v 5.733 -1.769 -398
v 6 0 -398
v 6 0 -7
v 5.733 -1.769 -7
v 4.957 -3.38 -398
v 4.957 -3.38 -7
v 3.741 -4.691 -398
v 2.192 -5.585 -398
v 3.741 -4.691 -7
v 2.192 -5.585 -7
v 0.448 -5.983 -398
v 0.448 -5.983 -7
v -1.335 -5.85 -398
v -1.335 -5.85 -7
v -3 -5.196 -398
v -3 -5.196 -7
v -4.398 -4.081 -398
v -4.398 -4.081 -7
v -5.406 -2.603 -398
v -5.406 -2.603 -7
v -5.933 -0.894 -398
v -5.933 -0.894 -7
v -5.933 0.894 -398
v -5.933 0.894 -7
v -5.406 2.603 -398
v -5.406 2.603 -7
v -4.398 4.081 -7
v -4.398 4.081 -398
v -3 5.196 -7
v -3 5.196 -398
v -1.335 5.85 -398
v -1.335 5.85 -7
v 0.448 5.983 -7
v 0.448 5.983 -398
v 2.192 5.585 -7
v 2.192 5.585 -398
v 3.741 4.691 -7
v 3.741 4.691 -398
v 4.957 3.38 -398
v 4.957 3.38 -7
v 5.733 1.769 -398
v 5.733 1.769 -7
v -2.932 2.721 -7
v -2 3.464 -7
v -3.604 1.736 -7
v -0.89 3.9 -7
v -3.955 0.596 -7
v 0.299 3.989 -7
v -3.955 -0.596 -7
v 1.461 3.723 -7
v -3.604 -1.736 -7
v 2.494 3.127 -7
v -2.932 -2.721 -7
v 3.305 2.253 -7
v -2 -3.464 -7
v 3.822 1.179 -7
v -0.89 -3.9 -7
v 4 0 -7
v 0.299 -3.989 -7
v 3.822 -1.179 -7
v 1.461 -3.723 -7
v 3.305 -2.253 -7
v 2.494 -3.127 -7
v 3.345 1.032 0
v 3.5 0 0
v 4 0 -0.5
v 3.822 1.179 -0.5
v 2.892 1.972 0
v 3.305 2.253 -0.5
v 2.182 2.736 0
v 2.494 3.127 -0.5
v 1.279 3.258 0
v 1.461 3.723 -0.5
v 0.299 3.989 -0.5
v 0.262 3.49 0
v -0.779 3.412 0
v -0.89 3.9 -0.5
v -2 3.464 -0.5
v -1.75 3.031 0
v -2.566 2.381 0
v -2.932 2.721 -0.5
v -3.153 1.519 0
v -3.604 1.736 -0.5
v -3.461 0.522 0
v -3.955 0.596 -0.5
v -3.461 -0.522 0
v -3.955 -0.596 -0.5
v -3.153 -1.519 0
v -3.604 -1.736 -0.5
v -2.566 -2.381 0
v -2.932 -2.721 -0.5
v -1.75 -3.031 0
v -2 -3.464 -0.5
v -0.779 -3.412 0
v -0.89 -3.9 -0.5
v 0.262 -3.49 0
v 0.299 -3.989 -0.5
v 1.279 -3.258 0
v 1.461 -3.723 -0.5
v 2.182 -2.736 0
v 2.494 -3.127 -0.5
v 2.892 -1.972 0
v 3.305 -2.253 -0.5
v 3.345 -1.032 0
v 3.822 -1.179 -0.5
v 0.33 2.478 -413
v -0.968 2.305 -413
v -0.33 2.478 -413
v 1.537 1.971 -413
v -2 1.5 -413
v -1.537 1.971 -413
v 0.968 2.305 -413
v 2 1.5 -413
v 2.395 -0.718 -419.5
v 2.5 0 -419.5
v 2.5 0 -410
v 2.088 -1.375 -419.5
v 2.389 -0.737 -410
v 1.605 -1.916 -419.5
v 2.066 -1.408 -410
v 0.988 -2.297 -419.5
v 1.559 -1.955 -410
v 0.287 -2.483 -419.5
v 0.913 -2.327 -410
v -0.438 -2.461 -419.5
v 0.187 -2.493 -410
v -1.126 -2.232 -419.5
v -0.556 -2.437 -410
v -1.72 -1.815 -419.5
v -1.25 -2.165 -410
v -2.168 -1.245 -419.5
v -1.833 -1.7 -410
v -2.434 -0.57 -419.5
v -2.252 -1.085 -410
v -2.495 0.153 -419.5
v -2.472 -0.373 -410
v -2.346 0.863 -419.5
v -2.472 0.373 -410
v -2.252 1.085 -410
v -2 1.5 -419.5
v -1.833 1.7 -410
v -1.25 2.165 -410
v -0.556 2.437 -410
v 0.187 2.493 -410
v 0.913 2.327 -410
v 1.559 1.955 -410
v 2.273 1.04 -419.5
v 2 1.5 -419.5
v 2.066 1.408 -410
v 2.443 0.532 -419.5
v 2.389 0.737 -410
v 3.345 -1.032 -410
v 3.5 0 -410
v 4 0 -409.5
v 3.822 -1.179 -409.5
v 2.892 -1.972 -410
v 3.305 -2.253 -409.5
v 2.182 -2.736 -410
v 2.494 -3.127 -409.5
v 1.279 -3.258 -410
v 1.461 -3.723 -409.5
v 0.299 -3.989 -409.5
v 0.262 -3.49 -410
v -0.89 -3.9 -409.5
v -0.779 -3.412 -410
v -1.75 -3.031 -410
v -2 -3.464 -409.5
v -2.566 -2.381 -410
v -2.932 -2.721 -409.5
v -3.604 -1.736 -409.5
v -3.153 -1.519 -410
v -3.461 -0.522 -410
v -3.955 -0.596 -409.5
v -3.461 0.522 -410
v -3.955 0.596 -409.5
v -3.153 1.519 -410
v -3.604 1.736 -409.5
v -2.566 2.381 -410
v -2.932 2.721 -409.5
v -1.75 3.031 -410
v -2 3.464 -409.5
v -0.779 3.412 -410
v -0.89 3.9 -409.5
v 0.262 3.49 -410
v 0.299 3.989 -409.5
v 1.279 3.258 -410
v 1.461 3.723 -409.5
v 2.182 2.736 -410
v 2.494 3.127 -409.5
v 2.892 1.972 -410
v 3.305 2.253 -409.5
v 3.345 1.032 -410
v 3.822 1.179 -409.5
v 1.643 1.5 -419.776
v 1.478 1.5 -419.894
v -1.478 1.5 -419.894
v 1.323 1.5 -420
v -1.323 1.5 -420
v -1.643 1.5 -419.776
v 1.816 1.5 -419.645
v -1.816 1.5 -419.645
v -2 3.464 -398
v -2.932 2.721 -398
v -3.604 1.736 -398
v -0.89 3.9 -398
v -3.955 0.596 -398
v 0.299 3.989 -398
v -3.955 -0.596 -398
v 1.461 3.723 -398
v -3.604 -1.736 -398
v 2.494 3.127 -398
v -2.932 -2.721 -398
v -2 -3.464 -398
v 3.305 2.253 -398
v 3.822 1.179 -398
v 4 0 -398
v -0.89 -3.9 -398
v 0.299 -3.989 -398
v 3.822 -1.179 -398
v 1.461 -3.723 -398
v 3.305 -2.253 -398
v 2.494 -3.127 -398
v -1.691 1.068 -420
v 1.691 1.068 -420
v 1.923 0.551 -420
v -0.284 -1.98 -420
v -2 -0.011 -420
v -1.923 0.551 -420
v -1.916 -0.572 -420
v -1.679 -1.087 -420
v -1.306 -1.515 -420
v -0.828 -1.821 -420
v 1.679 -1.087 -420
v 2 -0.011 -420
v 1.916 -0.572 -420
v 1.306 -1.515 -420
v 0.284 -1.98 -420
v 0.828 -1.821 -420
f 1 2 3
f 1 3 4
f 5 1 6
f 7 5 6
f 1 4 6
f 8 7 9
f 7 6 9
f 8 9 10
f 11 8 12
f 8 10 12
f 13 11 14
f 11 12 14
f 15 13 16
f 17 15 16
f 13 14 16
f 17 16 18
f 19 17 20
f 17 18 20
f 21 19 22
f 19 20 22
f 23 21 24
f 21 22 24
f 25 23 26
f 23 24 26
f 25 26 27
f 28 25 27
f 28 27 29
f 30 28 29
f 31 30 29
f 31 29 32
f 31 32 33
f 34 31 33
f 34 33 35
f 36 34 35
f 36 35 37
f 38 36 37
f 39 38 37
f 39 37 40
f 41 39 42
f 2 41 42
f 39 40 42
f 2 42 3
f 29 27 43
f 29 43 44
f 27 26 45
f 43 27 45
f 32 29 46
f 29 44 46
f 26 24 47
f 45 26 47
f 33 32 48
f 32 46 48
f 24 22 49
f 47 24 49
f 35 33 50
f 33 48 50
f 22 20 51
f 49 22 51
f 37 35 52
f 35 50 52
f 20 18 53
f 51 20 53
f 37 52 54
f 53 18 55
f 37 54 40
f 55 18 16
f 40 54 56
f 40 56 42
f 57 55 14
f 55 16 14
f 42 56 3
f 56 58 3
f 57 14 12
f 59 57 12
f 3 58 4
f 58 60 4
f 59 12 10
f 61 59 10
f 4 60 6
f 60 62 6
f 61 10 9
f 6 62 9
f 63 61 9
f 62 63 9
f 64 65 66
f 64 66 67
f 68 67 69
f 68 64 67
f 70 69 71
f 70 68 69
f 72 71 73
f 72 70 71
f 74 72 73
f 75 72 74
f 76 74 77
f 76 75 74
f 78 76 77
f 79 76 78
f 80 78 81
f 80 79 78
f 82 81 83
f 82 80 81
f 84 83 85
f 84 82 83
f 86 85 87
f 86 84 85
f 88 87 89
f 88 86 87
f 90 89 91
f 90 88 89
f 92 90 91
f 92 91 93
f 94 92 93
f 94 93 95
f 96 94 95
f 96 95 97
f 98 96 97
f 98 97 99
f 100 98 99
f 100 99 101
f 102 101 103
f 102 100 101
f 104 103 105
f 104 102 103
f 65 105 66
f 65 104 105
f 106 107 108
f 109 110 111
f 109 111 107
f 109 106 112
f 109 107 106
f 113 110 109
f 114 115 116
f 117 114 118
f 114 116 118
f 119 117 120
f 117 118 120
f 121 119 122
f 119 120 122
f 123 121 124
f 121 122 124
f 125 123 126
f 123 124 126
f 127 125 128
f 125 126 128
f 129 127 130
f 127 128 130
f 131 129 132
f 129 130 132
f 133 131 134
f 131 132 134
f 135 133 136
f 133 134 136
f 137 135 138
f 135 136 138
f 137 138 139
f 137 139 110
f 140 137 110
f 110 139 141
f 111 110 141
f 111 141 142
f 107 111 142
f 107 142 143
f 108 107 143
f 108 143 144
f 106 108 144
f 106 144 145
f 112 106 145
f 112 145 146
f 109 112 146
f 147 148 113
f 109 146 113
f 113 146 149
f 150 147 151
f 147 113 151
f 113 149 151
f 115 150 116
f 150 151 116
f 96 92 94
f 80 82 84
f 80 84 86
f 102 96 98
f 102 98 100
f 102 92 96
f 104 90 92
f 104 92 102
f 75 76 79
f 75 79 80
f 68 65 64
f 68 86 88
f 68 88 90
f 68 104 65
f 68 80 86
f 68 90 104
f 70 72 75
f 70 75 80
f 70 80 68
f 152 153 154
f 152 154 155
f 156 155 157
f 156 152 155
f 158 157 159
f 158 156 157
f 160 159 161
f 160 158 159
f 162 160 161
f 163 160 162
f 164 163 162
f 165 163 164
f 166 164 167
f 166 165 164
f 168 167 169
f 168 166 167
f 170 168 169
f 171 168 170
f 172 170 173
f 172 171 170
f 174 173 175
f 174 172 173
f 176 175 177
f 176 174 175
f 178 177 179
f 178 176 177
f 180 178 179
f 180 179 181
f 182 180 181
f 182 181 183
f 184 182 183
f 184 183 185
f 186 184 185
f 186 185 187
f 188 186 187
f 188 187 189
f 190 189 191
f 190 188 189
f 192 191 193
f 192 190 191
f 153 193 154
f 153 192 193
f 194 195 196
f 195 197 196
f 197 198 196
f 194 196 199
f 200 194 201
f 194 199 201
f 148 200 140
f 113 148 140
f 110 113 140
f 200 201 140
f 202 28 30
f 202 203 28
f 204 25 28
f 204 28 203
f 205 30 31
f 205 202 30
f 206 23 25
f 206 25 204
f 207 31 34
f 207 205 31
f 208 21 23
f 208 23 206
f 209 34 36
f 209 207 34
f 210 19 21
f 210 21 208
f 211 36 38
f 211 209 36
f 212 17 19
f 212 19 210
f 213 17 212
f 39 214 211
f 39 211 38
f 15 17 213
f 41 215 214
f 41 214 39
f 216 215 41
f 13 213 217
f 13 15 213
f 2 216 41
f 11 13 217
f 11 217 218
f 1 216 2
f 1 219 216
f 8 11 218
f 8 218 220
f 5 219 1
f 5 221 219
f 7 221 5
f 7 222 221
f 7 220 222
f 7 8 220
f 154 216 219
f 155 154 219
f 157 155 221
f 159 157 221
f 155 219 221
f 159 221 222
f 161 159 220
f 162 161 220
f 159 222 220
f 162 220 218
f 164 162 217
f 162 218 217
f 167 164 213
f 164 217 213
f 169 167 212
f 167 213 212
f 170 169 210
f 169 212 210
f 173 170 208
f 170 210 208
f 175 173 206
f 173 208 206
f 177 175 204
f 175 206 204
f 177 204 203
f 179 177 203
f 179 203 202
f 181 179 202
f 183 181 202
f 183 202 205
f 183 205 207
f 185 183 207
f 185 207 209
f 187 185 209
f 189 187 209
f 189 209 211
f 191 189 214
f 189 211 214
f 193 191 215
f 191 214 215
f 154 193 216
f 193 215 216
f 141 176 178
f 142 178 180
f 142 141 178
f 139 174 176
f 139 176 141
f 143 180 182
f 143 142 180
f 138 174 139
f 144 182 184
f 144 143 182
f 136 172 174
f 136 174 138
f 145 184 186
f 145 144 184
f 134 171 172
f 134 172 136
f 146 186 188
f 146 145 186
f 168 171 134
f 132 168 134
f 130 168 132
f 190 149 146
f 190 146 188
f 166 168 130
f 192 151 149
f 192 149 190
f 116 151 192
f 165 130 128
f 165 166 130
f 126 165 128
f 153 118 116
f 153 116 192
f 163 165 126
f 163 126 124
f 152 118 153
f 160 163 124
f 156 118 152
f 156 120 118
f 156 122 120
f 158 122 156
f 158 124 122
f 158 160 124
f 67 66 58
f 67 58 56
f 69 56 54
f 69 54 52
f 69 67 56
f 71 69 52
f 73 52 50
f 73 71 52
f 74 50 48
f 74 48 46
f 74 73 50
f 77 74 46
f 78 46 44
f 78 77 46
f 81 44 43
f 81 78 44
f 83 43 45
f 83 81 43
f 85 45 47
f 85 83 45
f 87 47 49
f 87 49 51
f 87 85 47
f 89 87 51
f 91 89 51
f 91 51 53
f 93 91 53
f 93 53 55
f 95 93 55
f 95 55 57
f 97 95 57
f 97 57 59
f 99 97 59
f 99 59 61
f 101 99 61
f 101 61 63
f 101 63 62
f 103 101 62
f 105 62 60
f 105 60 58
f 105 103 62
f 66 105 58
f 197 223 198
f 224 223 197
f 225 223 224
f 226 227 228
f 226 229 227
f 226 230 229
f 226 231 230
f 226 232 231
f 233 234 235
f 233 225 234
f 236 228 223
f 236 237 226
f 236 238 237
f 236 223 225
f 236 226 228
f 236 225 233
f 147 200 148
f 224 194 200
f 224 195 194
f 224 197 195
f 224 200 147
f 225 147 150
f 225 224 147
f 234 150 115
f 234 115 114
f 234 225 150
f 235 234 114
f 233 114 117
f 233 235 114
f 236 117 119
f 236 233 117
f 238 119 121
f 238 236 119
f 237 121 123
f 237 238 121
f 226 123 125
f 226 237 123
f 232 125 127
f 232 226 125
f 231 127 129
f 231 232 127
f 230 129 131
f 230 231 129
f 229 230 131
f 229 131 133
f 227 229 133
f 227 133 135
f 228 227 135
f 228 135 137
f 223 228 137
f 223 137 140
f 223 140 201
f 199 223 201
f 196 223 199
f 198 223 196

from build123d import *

# Parameters (mm, degrees)
F0_R      = 4
F1_DEPTH  = 7
F2_SIZE   = 0.5
F3_R      = 6
F4_DEPTH  = 391
F5_R      = 4
F6_DEPTH  = 12
F7_SIZE   = 0.5
F8_R      = 2.5
F9_DEPTH  = 10
F10_SIZE  = 0.5
F12_DEPTH = 7


with BuildPart() as f1:
    # F0 (on Top) → F1 (new body)
    with BuildSketch(Plane.XY):
        Circle(F0_R)
    extrude(amount=-F1_DEPTH)

    # F2
    f2_edges = [f1.edges().sort_by_distance(p)[0] for p in [
        (-4, 0, 0),
    ]]
    chamfer(f2_edges, length=F2_SIZE)

    # F3 (on face) → F4 (join)
    with BuildSketch(Plane(origin=(0, 0, -7), x_dir=(1, 0, 0), z_dir=(0, 0, -1))):
        Circle(F3_R)
    extrude(amount=F4_DEPTH)

    # F5 (on face) → F6 (join)
    with BuildSketch(Plane(origin=(0, 0, -398), x_dir=(1, 0, 0), z_dir=(0, 0, -1))):
        Circle(F5_R)
    extrude(amount=F6_DEPTH)

    # F7
    f7_edges = [f1.edges().sort_by_distance(p)[0] for p in [
        (-4, 0, -410),
    ]]
    chamfer(f7_edges, length=F7_SIZE)

    # F8 (on face) → F9 (join)
    with BuildSketch(Plane(origin=(0, 0, -410), x_dir=(1, 0, 0), z_dir=(0, 0, -1))):
        Circle(F8_R)
    extrude(amount=F9_DEPTH)

    # F10
    f10_edges = [f1.edges().sort_by_distance(p)[0] for p in [
        (-2.5, 0, -420),
    ]]
    chamfer(f10_edges, length=F10_SIZE)

    # F11 (on face) → F12 (cut)
    with BuildSketch(Plane(origin=(0, 0, -420), x_dir=(1, 0, 0), z_dir=(0, 0, -1))):
        with BuildLine():
            Line((1.3228756555, -1.5), (-1.3228756555, -1.5))
            ThreePointArc((-1.3228756555, -1.5), (0, -2), (1.3228756555, -1.5))
        make_face()
        with BuildLine():
            Line((-1.3228756555, -1.5), (-2, -1.5))
            ThreePointArc((-2, -1.5), (0, -2.5), (2, -1.5))
            Line((2, -1.5), (1.3228756555, -1.5))
            ThreePointArc((1.3228756555, -1.5), (0, -2), (-1.3228756555, -1.5))
        make_face()
    extrude(amount=-F12_DEPTH, mode=Mode.SUBTRACT)


solid = f1.part
